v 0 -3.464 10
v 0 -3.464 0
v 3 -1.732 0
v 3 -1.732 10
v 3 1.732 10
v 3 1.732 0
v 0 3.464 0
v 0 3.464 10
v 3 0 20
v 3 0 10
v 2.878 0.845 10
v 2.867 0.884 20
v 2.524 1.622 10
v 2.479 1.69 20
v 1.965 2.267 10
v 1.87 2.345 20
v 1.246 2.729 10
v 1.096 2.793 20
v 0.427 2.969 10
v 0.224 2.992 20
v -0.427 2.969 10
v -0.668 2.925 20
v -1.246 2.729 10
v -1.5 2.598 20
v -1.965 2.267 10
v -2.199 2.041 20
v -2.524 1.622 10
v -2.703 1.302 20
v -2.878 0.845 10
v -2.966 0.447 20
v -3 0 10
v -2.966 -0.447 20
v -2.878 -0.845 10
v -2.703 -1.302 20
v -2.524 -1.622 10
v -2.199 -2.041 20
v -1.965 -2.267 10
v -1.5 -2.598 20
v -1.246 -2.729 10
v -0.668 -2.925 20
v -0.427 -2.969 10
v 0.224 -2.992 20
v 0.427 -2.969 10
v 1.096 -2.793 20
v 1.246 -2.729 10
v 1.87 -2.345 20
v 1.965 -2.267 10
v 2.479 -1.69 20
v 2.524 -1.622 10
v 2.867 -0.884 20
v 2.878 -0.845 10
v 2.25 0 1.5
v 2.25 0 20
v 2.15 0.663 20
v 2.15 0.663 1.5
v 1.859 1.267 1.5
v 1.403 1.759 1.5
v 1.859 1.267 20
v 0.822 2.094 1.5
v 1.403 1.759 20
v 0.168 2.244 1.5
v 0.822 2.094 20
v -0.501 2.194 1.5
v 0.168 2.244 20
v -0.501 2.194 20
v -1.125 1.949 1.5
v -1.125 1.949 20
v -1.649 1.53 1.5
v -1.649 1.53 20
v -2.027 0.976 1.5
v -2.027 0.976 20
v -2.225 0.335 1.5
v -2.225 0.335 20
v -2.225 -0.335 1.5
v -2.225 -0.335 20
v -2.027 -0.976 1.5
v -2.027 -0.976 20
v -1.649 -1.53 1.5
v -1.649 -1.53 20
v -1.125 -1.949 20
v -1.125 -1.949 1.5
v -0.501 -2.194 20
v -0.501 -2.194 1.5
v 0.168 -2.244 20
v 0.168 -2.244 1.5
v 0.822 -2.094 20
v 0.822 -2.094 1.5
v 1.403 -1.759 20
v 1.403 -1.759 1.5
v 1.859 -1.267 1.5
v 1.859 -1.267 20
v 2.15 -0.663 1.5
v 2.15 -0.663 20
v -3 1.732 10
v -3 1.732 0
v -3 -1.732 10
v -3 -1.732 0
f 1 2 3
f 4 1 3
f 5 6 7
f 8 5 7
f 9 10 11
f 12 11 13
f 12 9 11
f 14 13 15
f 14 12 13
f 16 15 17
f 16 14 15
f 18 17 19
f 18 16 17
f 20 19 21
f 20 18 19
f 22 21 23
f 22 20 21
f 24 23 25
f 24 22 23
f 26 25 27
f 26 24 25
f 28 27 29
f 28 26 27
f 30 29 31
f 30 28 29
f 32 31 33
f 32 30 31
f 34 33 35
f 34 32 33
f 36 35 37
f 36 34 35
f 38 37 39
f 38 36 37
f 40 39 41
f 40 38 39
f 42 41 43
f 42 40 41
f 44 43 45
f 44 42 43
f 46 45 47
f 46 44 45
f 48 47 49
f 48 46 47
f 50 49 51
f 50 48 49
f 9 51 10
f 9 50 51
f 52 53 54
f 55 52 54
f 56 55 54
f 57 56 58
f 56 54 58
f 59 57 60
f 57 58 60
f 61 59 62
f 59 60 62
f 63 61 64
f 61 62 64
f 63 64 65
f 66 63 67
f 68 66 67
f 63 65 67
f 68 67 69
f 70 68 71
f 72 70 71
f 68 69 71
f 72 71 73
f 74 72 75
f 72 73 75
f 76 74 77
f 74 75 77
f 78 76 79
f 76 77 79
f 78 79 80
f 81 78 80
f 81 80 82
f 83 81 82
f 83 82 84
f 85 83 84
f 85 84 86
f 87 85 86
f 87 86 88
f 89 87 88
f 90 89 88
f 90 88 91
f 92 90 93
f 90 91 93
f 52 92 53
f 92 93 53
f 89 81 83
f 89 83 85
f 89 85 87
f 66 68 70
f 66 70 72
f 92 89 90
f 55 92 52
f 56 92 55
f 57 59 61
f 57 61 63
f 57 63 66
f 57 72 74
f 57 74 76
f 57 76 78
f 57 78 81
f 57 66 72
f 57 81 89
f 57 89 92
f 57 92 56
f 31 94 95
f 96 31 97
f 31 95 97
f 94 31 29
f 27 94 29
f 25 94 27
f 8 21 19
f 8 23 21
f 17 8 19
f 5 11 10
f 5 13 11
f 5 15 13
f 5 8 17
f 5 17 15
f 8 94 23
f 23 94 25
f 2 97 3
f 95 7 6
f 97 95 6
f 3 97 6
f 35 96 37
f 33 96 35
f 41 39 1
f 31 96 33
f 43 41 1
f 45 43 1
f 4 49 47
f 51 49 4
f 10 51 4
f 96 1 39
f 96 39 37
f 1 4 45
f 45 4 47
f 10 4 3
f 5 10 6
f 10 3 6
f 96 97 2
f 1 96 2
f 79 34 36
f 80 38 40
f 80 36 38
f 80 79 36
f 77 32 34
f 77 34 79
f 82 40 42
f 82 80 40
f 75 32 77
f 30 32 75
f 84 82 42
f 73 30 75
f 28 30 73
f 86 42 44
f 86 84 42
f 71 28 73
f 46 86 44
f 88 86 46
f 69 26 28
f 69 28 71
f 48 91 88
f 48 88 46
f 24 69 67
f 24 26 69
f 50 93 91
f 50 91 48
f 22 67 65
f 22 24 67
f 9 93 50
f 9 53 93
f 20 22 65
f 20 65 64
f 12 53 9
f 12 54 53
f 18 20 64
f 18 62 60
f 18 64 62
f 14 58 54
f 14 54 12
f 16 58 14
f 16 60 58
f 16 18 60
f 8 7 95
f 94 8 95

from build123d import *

# Parameters (mm, degrees)
F1_DEPTH = 20
F2_W     = 8
F2_H     = 8
F2_R     = 3
F3_DEPTH = 10
F4_R     = 2.25
F5_DEPTH = 18.5


with BuildPart() as f1:
    # F0 (on Top) → F1 (new body)
    with BuildSketch(Plane.XY):
        Polygon((0, -3.464102), (3, -1.732051), (3, 1.732051), (0, 3.464102), (-3, 1.732051), (-3, -1.732051), align=None)
    extrude(amount=F1_DEPTH)

    # F2 (on face) → F3 (cut)
    with BuildSketch(Plane.XY.offset(20)):
        Rectangle(F2_W, F2_H)
        Circle(F2_R, mode=Mode.SUBTRACT)
    extrude(amount=-F3_DEPTH, mode=Mode.SUBTRACT)

    # F4 (on face) → F5 (cut)
    with BuildSketch(Plane.XY.offset(20)):
        Circle(F4_R)
    extrude(amount=-F5_DEPTH, mode=Mode.SUBTRACT)


solid = f1.part
